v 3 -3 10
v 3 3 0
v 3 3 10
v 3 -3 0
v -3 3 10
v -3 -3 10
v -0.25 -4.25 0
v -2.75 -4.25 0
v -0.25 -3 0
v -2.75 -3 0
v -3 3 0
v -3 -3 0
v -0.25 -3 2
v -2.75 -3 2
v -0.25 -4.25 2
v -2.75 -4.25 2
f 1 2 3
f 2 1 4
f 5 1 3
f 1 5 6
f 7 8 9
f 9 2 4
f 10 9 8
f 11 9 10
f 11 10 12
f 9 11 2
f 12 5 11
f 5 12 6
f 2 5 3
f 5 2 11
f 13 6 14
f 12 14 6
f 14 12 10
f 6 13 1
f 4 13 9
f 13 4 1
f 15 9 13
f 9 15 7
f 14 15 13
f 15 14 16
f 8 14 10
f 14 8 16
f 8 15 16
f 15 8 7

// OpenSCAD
translate([0, 0, 5]) color([0,1,0,0.9]) cube([6, 6, 10], center=true);
translate([-0.5, -0.5, 1]) color([1,0,0]) cube([0.5, 0.5, 2], center=true);
translate([-1.0, -0.5, 1]) color([1,0,0]) cube([0.5, 0.5, 2], center=true);
translate([-1.5, -0.5, 1]) color([1,0,0]) cube([0.5, 0.5, 2], center=true);
translate([-2.0, -0.5, 1]) color([1,0,0]) cube([0.5, 0.5, 2], center=true);
translate([-2.5, -0.5, 1]) color([1,0,0]) cube([0.5, 0.5, 2], center=true);
translate([-0.5, -1.0, 1]) color([1,0,0]) cube([0.5, 0.5, 2], center=true);
translate([-1.0, -1.0, 1]) color([1,0,0]) cube([0.5, 0.5, 2], center=true);
translate([-1.5, -1.0, 1]) color([1,0,0]) cube([0.5, 0.5, 2], center=true);
translate([-2.0, -1.0, 1]) color([1,0,0]) cube([0.5, 0.5, 2], center=true);
translate([-2.5, -1.0, 1]) color([1,0,0]) cube([0.5, 0.5, 2], center=true);
translate([-0.5, -1.5, 1]) color([1,0,0]) cube([0.5, 0.5, 2], center=true);
translate([-1.0, -1.5, 1]) color([1,0,0]) cube([0.5, 0.5, 2], center=true);
translate([-1.5, -1.5, 1]) color([1,0,0]) cube([0.5, 0.5, 2], center=true);
translate([-2.0, -1.5, 1]) color([1,0,0]) cube([0.5, 0.5, 2], center=true);
translate([-2.5, -1.5, 1]) color([1,0,0]) cube([0.5, 0.5, 2], center=true);
translate([-0.5, -2.0, 1]) color([1,0,0]) cube([0.5, 0.5, 2], center=true);
translate([-1.0, -2.0, 1]) color([1,0,0]) cube([0.5, 0.5, 2], center=true);
translate([-1.5, -2.0, 1]) color([1,0,0]) cube([0.5, 0.5, 2], center=true);
translate([-2.0, -2.0, 1]) color([1,0,0]) cube([0.5, 0.5, 2], center=true);
translate([-2.5, -2.0, 1]) color([1,0,0]) cube([0.5, 0.5, 2], center=true);
translate([-0.5, -2.5, 1]) color([1,0,0]) cube([0.5, 0.5, 2], center=true);
translate([-1.0, -2.5, 1]) color([1,0,0]) cube([0.5, 0.5, 2], center=true);
translate([-1.5, -2.5, 1]) color([1,0,0]) cube([0.5, 0.5, 2], center=true);
translate([-2.0, -2.5, 1]) color([1,0,0]) cube([0.5, 0.5, 2], center=true);
translate([-2.5, -2.5, 1]) color([1,0,0]) cube([0.5, 0.5, 2], center=true);
translate([-0.5, -3.0, 1]) color([1,0,0]) cube([0.5, 0.5, 2], center=true);
translate([-1.0, -3.0, 1]) color([1,0,0]) cube([0.5, 0.5, 2], center=true);
translate([-1.5, -3.0, 1]) color([1,0,0]) cube([0.5, 0.5, 2], center=true);
translate([-2.0, -3.0, 1]) color([1,0,0]) cube([0.5, 0.5, 2], center=true);
translate([-2.5, -3.0, 1]) color([1,0,0]) cube([0.5, 0.5, 2], center=true);
translate([-0.5, -3.5, 1]) color([1,0,0]) cube([0.5, 0.5, 2], center=true);
translate([-1.0, -3.5, 1]) color([1,0,0]) cube([0.5, 0.5, 2], center=true);
translate([-1.5, -3.5, 1]) color([1,0,0]) cube([0.5, 0.5, 2], center=true);
translate([-2.0, -3.5, 1]) color([1,0,0]) cube([0.5, 0.5, 2], center=true);
translate([-2.5, -3.5, 1]) color([1,0,0]) cube([0.5, 0.5, 2], center=true);
translate([-0.5, -4.0, 1]) color([1,0,0]) cube([0.5, 0.5, 2], center=true);
translate([-1.0, -4.0, 1]) color([1,0,0]) cube([0.5, 0.5, 2], center=true);
translate([-1.5, -4.0, 1]) color([1,0,0]) cube([0.5, 0.5, 2], center=true);
translate([-2.0, -4.0, 1]) color([1,0,0]) cube([0.5, 0.5, 2], center=true);
translate([-2.5, -4.0, 1]) color([1,0,0]) cube([0.5, 0.5, 2], center=true);
